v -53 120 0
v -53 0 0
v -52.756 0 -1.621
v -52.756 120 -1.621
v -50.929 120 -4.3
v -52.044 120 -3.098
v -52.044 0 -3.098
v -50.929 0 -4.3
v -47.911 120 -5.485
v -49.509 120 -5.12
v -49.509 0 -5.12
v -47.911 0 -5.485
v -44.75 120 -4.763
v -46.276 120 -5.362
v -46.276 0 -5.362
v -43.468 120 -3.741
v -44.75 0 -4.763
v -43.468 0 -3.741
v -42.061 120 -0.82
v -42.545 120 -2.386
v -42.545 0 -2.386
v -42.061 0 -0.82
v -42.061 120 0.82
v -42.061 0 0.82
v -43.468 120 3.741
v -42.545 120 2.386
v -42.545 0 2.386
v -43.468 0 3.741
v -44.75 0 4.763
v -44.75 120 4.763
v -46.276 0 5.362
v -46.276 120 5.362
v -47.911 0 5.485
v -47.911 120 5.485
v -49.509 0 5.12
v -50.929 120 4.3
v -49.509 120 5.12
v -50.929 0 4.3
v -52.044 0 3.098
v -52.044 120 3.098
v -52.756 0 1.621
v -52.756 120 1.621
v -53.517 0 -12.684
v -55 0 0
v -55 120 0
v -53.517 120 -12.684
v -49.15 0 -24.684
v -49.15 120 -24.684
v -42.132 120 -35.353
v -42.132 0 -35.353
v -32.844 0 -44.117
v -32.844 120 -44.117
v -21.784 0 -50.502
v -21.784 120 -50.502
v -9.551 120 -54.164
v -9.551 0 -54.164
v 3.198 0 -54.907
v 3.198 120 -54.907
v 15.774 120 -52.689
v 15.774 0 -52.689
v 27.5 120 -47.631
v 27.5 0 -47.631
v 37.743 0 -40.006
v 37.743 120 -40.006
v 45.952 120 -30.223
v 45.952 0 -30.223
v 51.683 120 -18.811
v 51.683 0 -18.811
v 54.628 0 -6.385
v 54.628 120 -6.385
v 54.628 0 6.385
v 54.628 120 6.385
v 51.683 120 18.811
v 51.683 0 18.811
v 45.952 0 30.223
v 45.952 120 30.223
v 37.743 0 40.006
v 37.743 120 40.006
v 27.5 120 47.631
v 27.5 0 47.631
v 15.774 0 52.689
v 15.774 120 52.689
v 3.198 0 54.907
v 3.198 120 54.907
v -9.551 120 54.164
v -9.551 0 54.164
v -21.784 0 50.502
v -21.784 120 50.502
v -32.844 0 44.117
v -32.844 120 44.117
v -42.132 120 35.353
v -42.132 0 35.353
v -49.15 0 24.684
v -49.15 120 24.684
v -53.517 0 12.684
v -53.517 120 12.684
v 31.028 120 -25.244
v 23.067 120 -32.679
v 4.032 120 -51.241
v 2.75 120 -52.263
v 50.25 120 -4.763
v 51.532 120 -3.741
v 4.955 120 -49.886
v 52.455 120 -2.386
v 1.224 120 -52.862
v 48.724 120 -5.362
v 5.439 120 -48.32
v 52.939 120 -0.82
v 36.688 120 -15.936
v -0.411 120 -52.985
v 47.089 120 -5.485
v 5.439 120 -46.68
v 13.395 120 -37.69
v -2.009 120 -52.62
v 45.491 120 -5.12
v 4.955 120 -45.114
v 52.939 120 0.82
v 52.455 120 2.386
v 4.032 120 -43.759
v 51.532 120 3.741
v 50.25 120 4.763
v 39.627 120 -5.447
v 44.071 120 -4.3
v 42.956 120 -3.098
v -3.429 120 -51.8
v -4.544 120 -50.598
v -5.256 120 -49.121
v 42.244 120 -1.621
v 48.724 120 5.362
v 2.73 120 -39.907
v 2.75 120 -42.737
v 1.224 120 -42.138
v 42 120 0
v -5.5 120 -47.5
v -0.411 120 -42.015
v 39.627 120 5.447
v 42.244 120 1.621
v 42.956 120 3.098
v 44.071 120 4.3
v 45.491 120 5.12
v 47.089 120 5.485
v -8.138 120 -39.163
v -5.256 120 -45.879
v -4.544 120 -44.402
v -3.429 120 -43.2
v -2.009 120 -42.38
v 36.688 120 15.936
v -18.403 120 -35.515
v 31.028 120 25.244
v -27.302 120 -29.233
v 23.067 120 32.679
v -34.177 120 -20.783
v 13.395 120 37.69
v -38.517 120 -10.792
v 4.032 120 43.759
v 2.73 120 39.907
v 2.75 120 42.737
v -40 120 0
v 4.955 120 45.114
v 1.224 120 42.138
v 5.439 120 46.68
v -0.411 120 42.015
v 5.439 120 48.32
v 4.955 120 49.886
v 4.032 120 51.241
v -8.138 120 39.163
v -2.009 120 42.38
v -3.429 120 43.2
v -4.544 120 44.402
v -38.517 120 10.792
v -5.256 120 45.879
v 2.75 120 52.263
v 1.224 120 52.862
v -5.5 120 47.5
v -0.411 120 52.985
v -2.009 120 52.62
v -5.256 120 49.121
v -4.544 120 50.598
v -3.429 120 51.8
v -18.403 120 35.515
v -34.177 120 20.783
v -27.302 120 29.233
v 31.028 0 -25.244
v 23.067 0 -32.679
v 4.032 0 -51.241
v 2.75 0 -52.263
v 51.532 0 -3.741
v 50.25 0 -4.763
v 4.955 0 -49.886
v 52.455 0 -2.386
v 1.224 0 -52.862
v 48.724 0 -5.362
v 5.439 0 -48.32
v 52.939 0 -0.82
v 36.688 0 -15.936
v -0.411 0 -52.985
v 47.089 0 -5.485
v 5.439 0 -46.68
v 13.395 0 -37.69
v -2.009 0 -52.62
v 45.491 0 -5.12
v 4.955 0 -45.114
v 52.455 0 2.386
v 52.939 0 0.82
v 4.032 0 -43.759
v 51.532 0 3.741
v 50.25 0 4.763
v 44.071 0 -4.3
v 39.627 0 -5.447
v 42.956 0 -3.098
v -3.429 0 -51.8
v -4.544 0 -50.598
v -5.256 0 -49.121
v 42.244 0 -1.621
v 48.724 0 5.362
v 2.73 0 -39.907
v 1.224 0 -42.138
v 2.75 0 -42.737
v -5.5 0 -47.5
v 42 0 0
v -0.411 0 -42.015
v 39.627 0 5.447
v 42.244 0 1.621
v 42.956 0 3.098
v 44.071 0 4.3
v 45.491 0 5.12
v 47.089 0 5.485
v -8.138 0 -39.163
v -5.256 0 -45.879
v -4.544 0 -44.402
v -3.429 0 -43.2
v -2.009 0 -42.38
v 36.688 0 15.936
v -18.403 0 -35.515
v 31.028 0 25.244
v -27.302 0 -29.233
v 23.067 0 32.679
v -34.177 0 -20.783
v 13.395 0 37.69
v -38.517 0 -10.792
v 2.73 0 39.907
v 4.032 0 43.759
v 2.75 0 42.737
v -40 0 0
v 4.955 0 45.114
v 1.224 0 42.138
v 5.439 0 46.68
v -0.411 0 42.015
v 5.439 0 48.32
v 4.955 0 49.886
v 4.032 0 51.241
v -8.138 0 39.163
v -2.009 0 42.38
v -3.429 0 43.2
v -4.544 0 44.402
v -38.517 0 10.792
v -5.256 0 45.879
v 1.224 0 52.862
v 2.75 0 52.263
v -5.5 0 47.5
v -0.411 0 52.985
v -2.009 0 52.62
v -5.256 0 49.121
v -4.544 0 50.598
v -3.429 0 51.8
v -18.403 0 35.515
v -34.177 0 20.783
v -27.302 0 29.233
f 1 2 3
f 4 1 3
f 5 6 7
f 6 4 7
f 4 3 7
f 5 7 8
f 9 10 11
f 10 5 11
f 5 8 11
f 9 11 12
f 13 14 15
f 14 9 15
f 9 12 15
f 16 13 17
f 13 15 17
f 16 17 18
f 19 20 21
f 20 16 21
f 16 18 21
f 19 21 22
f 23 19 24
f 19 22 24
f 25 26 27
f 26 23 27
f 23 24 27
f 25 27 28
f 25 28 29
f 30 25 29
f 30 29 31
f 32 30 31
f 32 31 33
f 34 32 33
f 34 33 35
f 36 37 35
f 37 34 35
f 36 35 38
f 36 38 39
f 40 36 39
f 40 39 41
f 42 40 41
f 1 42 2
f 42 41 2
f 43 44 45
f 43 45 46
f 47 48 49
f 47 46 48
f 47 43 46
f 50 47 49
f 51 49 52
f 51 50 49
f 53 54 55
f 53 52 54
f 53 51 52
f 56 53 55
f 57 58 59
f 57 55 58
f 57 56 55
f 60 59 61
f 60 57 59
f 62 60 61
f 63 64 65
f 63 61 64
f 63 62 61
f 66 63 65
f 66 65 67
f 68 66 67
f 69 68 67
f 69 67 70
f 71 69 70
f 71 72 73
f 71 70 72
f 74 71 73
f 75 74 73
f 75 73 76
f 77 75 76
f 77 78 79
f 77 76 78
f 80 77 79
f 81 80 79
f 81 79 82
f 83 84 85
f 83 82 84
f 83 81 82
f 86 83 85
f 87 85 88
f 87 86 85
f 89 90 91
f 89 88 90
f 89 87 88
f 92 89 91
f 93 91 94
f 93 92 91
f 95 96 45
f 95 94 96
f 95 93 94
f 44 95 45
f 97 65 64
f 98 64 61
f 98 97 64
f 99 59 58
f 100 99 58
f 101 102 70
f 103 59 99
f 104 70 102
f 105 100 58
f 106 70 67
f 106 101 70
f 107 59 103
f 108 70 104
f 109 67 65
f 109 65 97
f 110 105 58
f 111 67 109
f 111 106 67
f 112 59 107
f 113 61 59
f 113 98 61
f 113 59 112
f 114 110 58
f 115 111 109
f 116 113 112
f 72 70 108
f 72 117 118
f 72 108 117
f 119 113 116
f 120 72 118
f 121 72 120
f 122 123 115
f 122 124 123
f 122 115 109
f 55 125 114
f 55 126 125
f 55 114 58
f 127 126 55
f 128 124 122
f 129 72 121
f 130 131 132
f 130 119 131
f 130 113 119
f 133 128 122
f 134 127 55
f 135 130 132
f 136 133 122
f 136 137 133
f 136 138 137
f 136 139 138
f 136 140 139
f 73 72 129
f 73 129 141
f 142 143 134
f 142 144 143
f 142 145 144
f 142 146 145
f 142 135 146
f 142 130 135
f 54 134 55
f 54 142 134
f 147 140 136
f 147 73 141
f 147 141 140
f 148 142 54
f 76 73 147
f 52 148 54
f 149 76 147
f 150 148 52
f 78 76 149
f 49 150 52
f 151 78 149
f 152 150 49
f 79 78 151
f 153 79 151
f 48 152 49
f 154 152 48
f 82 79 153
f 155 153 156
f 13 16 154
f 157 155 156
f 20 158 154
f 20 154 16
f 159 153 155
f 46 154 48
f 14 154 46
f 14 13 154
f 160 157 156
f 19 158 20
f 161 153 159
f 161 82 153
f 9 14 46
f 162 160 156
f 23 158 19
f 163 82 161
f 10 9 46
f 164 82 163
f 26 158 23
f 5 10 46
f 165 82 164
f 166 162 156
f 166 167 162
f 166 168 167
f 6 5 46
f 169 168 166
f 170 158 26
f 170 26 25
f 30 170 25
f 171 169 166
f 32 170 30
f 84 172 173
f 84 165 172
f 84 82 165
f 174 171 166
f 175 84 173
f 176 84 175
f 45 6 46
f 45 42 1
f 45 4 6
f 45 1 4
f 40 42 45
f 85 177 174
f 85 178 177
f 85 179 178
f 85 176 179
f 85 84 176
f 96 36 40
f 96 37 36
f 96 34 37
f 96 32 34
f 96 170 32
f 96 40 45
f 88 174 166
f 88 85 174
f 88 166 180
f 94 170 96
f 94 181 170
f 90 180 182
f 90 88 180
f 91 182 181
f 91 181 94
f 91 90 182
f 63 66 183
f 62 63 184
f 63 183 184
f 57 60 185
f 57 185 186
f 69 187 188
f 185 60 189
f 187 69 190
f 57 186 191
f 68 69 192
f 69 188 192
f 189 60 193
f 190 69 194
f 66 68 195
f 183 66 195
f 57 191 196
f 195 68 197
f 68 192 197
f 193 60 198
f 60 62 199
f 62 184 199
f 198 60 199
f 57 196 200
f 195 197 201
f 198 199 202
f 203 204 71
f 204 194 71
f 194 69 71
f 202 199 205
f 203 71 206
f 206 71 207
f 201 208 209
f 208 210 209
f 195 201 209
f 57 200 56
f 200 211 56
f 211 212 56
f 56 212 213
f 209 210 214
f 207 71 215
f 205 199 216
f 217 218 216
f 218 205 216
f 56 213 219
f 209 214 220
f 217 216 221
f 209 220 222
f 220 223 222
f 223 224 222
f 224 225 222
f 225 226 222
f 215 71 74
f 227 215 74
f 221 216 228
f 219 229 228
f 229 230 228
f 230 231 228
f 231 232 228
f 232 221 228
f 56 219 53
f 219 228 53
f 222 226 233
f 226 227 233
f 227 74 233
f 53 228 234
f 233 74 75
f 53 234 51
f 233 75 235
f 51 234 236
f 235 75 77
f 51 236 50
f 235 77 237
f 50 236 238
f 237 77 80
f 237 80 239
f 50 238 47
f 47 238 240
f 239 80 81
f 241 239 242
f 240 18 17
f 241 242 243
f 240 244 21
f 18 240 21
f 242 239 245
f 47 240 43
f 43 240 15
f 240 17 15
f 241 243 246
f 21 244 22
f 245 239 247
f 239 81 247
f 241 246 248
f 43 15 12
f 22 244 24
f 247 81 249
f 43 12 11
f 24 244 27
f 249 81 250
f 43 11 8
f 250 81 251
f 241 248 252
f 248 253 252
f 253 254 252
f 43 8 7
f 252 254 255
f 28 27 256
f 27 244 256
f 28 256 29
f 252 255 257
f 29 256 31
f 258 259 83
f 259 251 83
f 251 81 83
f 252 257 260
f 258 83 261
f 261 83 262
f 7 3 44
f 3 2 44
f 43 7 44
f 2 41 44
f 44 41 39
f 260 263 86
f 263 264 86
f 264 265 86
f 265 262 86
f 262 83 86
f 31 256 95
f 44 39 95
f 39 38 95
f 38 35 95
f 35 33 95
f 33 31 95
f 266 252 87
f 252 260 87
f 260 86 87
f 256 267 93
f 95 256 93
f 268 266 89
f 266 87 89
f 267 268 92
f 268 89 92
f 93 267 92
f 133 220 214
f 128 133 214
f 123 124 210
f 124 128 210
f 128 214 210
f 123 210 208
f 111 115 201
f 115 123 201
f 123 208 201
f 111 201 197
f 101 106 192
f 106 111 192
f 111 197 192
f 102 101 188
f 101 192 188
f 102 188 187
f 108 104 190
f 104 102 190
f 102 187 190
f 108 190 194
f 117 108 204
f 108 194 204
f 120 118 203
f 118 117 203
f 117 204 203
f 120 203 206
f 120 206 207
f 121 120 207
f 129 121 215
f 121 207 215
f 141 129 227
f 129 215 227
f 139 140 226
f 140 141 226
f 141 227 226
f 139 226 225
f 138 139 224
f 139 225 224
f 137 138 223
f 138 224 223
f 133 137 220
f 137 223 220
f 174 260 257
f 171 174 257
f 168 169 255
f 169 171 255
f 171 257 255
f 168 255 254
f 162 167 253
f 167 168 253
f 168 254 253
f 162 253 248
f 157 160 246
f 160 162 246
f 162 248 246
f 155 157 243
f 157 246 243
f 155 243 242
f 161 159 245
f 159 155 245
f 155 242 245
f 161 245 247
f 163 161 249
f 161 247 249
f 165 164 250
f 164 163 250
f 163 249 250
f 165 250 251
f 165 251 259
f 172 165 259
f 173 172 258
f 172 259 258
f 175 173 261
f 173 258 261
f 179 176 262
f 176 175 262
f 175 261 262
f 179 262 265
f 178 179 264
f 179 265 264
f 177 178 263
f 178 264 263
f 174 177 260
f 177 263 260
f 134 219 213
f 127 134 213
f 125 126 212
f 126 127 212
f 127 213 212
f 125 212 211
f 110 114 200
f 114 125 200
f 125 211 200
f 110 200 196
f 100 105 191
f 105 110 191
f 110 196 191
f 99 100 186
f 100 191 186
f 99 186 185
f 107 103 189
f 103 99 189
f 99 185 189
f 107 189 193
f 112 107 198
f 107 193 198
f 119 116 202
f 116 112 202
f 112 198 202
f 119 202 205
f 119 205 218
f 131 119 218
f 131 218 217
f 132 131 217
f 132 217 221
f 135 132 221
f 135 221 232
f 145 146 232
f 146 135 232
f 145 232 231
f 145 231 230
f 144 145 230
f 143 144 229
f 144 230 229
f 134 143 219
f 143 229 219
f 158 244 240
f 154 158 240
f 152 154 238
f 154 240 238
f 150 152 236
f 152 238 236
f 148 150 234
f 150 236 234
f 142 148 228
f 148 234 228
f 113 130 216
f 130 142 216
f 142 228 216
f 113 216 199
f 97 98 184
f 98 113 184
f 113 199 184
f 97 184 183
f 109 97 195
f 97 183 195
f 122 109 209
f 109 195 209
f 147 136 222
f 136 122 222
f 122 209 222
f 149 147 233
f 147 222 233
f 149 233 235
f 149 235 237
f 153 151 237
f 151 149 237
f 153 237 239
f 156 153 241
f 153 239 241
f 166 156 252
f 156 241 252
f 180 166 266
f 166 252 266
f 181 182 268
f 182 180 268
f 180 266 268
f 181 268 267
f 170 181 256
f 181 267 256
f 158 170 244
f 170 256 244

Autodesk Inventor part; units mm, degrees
ref_plane "YZ Plane" through (0, 0, 0) normal (1, 0, 0) x (0, 1, 0)
ref_plane "XZ Plane" through (0, 0, 0) normal (0, 1, 0) x (-1, 0, 0)
ref_plane "XY Plane" through (0, 0, 0) normal (0, 0, 1) x (1, 0, 0)
sketch "Sketch1" plane through (0, 0, 0) normal (0, 1, 0) x (-1, 0, 0)
  circle A0 centre (0, 0) radius 40
  circle A1 centre (0, 0) radius 55
  circle A2 centre (47.5, 0) radius 5.5
  circle A3 centre (0, -47.5) radius 5.5
  circle A4 centre (0, 47.5) radius 5.5
  circle A5 centre (-47.5, 0) radius 5.5
  dimension "d0" = 80
  dimension "d10" = 11
  dimension "d11" = 11
  dimension "d12" = 11
  dimension "d13" = 11
extrude "Extrusion1" add sketch "Sketch1" along normal blind 120
equation "\"BendRadius\" = Thickness"
equation "\"BendReliefWidth\" = Thickness"
equation "\"BendReliefDepth\" = 0.5 * Thickness"
equation "\"CornerReliefSize\" = 4 * Thickness"
equation "\"MinimumRemnant\" = 2 * Thickness"
equation "\"TransitionRadius\" = BendRadius"
equation "\"JacobiRadiusSize\" = BendRadius"
equation "\"GapSize\" = Thickness"
equation "\"Thickness\" = 0.5"
properties part number "cilindro"
